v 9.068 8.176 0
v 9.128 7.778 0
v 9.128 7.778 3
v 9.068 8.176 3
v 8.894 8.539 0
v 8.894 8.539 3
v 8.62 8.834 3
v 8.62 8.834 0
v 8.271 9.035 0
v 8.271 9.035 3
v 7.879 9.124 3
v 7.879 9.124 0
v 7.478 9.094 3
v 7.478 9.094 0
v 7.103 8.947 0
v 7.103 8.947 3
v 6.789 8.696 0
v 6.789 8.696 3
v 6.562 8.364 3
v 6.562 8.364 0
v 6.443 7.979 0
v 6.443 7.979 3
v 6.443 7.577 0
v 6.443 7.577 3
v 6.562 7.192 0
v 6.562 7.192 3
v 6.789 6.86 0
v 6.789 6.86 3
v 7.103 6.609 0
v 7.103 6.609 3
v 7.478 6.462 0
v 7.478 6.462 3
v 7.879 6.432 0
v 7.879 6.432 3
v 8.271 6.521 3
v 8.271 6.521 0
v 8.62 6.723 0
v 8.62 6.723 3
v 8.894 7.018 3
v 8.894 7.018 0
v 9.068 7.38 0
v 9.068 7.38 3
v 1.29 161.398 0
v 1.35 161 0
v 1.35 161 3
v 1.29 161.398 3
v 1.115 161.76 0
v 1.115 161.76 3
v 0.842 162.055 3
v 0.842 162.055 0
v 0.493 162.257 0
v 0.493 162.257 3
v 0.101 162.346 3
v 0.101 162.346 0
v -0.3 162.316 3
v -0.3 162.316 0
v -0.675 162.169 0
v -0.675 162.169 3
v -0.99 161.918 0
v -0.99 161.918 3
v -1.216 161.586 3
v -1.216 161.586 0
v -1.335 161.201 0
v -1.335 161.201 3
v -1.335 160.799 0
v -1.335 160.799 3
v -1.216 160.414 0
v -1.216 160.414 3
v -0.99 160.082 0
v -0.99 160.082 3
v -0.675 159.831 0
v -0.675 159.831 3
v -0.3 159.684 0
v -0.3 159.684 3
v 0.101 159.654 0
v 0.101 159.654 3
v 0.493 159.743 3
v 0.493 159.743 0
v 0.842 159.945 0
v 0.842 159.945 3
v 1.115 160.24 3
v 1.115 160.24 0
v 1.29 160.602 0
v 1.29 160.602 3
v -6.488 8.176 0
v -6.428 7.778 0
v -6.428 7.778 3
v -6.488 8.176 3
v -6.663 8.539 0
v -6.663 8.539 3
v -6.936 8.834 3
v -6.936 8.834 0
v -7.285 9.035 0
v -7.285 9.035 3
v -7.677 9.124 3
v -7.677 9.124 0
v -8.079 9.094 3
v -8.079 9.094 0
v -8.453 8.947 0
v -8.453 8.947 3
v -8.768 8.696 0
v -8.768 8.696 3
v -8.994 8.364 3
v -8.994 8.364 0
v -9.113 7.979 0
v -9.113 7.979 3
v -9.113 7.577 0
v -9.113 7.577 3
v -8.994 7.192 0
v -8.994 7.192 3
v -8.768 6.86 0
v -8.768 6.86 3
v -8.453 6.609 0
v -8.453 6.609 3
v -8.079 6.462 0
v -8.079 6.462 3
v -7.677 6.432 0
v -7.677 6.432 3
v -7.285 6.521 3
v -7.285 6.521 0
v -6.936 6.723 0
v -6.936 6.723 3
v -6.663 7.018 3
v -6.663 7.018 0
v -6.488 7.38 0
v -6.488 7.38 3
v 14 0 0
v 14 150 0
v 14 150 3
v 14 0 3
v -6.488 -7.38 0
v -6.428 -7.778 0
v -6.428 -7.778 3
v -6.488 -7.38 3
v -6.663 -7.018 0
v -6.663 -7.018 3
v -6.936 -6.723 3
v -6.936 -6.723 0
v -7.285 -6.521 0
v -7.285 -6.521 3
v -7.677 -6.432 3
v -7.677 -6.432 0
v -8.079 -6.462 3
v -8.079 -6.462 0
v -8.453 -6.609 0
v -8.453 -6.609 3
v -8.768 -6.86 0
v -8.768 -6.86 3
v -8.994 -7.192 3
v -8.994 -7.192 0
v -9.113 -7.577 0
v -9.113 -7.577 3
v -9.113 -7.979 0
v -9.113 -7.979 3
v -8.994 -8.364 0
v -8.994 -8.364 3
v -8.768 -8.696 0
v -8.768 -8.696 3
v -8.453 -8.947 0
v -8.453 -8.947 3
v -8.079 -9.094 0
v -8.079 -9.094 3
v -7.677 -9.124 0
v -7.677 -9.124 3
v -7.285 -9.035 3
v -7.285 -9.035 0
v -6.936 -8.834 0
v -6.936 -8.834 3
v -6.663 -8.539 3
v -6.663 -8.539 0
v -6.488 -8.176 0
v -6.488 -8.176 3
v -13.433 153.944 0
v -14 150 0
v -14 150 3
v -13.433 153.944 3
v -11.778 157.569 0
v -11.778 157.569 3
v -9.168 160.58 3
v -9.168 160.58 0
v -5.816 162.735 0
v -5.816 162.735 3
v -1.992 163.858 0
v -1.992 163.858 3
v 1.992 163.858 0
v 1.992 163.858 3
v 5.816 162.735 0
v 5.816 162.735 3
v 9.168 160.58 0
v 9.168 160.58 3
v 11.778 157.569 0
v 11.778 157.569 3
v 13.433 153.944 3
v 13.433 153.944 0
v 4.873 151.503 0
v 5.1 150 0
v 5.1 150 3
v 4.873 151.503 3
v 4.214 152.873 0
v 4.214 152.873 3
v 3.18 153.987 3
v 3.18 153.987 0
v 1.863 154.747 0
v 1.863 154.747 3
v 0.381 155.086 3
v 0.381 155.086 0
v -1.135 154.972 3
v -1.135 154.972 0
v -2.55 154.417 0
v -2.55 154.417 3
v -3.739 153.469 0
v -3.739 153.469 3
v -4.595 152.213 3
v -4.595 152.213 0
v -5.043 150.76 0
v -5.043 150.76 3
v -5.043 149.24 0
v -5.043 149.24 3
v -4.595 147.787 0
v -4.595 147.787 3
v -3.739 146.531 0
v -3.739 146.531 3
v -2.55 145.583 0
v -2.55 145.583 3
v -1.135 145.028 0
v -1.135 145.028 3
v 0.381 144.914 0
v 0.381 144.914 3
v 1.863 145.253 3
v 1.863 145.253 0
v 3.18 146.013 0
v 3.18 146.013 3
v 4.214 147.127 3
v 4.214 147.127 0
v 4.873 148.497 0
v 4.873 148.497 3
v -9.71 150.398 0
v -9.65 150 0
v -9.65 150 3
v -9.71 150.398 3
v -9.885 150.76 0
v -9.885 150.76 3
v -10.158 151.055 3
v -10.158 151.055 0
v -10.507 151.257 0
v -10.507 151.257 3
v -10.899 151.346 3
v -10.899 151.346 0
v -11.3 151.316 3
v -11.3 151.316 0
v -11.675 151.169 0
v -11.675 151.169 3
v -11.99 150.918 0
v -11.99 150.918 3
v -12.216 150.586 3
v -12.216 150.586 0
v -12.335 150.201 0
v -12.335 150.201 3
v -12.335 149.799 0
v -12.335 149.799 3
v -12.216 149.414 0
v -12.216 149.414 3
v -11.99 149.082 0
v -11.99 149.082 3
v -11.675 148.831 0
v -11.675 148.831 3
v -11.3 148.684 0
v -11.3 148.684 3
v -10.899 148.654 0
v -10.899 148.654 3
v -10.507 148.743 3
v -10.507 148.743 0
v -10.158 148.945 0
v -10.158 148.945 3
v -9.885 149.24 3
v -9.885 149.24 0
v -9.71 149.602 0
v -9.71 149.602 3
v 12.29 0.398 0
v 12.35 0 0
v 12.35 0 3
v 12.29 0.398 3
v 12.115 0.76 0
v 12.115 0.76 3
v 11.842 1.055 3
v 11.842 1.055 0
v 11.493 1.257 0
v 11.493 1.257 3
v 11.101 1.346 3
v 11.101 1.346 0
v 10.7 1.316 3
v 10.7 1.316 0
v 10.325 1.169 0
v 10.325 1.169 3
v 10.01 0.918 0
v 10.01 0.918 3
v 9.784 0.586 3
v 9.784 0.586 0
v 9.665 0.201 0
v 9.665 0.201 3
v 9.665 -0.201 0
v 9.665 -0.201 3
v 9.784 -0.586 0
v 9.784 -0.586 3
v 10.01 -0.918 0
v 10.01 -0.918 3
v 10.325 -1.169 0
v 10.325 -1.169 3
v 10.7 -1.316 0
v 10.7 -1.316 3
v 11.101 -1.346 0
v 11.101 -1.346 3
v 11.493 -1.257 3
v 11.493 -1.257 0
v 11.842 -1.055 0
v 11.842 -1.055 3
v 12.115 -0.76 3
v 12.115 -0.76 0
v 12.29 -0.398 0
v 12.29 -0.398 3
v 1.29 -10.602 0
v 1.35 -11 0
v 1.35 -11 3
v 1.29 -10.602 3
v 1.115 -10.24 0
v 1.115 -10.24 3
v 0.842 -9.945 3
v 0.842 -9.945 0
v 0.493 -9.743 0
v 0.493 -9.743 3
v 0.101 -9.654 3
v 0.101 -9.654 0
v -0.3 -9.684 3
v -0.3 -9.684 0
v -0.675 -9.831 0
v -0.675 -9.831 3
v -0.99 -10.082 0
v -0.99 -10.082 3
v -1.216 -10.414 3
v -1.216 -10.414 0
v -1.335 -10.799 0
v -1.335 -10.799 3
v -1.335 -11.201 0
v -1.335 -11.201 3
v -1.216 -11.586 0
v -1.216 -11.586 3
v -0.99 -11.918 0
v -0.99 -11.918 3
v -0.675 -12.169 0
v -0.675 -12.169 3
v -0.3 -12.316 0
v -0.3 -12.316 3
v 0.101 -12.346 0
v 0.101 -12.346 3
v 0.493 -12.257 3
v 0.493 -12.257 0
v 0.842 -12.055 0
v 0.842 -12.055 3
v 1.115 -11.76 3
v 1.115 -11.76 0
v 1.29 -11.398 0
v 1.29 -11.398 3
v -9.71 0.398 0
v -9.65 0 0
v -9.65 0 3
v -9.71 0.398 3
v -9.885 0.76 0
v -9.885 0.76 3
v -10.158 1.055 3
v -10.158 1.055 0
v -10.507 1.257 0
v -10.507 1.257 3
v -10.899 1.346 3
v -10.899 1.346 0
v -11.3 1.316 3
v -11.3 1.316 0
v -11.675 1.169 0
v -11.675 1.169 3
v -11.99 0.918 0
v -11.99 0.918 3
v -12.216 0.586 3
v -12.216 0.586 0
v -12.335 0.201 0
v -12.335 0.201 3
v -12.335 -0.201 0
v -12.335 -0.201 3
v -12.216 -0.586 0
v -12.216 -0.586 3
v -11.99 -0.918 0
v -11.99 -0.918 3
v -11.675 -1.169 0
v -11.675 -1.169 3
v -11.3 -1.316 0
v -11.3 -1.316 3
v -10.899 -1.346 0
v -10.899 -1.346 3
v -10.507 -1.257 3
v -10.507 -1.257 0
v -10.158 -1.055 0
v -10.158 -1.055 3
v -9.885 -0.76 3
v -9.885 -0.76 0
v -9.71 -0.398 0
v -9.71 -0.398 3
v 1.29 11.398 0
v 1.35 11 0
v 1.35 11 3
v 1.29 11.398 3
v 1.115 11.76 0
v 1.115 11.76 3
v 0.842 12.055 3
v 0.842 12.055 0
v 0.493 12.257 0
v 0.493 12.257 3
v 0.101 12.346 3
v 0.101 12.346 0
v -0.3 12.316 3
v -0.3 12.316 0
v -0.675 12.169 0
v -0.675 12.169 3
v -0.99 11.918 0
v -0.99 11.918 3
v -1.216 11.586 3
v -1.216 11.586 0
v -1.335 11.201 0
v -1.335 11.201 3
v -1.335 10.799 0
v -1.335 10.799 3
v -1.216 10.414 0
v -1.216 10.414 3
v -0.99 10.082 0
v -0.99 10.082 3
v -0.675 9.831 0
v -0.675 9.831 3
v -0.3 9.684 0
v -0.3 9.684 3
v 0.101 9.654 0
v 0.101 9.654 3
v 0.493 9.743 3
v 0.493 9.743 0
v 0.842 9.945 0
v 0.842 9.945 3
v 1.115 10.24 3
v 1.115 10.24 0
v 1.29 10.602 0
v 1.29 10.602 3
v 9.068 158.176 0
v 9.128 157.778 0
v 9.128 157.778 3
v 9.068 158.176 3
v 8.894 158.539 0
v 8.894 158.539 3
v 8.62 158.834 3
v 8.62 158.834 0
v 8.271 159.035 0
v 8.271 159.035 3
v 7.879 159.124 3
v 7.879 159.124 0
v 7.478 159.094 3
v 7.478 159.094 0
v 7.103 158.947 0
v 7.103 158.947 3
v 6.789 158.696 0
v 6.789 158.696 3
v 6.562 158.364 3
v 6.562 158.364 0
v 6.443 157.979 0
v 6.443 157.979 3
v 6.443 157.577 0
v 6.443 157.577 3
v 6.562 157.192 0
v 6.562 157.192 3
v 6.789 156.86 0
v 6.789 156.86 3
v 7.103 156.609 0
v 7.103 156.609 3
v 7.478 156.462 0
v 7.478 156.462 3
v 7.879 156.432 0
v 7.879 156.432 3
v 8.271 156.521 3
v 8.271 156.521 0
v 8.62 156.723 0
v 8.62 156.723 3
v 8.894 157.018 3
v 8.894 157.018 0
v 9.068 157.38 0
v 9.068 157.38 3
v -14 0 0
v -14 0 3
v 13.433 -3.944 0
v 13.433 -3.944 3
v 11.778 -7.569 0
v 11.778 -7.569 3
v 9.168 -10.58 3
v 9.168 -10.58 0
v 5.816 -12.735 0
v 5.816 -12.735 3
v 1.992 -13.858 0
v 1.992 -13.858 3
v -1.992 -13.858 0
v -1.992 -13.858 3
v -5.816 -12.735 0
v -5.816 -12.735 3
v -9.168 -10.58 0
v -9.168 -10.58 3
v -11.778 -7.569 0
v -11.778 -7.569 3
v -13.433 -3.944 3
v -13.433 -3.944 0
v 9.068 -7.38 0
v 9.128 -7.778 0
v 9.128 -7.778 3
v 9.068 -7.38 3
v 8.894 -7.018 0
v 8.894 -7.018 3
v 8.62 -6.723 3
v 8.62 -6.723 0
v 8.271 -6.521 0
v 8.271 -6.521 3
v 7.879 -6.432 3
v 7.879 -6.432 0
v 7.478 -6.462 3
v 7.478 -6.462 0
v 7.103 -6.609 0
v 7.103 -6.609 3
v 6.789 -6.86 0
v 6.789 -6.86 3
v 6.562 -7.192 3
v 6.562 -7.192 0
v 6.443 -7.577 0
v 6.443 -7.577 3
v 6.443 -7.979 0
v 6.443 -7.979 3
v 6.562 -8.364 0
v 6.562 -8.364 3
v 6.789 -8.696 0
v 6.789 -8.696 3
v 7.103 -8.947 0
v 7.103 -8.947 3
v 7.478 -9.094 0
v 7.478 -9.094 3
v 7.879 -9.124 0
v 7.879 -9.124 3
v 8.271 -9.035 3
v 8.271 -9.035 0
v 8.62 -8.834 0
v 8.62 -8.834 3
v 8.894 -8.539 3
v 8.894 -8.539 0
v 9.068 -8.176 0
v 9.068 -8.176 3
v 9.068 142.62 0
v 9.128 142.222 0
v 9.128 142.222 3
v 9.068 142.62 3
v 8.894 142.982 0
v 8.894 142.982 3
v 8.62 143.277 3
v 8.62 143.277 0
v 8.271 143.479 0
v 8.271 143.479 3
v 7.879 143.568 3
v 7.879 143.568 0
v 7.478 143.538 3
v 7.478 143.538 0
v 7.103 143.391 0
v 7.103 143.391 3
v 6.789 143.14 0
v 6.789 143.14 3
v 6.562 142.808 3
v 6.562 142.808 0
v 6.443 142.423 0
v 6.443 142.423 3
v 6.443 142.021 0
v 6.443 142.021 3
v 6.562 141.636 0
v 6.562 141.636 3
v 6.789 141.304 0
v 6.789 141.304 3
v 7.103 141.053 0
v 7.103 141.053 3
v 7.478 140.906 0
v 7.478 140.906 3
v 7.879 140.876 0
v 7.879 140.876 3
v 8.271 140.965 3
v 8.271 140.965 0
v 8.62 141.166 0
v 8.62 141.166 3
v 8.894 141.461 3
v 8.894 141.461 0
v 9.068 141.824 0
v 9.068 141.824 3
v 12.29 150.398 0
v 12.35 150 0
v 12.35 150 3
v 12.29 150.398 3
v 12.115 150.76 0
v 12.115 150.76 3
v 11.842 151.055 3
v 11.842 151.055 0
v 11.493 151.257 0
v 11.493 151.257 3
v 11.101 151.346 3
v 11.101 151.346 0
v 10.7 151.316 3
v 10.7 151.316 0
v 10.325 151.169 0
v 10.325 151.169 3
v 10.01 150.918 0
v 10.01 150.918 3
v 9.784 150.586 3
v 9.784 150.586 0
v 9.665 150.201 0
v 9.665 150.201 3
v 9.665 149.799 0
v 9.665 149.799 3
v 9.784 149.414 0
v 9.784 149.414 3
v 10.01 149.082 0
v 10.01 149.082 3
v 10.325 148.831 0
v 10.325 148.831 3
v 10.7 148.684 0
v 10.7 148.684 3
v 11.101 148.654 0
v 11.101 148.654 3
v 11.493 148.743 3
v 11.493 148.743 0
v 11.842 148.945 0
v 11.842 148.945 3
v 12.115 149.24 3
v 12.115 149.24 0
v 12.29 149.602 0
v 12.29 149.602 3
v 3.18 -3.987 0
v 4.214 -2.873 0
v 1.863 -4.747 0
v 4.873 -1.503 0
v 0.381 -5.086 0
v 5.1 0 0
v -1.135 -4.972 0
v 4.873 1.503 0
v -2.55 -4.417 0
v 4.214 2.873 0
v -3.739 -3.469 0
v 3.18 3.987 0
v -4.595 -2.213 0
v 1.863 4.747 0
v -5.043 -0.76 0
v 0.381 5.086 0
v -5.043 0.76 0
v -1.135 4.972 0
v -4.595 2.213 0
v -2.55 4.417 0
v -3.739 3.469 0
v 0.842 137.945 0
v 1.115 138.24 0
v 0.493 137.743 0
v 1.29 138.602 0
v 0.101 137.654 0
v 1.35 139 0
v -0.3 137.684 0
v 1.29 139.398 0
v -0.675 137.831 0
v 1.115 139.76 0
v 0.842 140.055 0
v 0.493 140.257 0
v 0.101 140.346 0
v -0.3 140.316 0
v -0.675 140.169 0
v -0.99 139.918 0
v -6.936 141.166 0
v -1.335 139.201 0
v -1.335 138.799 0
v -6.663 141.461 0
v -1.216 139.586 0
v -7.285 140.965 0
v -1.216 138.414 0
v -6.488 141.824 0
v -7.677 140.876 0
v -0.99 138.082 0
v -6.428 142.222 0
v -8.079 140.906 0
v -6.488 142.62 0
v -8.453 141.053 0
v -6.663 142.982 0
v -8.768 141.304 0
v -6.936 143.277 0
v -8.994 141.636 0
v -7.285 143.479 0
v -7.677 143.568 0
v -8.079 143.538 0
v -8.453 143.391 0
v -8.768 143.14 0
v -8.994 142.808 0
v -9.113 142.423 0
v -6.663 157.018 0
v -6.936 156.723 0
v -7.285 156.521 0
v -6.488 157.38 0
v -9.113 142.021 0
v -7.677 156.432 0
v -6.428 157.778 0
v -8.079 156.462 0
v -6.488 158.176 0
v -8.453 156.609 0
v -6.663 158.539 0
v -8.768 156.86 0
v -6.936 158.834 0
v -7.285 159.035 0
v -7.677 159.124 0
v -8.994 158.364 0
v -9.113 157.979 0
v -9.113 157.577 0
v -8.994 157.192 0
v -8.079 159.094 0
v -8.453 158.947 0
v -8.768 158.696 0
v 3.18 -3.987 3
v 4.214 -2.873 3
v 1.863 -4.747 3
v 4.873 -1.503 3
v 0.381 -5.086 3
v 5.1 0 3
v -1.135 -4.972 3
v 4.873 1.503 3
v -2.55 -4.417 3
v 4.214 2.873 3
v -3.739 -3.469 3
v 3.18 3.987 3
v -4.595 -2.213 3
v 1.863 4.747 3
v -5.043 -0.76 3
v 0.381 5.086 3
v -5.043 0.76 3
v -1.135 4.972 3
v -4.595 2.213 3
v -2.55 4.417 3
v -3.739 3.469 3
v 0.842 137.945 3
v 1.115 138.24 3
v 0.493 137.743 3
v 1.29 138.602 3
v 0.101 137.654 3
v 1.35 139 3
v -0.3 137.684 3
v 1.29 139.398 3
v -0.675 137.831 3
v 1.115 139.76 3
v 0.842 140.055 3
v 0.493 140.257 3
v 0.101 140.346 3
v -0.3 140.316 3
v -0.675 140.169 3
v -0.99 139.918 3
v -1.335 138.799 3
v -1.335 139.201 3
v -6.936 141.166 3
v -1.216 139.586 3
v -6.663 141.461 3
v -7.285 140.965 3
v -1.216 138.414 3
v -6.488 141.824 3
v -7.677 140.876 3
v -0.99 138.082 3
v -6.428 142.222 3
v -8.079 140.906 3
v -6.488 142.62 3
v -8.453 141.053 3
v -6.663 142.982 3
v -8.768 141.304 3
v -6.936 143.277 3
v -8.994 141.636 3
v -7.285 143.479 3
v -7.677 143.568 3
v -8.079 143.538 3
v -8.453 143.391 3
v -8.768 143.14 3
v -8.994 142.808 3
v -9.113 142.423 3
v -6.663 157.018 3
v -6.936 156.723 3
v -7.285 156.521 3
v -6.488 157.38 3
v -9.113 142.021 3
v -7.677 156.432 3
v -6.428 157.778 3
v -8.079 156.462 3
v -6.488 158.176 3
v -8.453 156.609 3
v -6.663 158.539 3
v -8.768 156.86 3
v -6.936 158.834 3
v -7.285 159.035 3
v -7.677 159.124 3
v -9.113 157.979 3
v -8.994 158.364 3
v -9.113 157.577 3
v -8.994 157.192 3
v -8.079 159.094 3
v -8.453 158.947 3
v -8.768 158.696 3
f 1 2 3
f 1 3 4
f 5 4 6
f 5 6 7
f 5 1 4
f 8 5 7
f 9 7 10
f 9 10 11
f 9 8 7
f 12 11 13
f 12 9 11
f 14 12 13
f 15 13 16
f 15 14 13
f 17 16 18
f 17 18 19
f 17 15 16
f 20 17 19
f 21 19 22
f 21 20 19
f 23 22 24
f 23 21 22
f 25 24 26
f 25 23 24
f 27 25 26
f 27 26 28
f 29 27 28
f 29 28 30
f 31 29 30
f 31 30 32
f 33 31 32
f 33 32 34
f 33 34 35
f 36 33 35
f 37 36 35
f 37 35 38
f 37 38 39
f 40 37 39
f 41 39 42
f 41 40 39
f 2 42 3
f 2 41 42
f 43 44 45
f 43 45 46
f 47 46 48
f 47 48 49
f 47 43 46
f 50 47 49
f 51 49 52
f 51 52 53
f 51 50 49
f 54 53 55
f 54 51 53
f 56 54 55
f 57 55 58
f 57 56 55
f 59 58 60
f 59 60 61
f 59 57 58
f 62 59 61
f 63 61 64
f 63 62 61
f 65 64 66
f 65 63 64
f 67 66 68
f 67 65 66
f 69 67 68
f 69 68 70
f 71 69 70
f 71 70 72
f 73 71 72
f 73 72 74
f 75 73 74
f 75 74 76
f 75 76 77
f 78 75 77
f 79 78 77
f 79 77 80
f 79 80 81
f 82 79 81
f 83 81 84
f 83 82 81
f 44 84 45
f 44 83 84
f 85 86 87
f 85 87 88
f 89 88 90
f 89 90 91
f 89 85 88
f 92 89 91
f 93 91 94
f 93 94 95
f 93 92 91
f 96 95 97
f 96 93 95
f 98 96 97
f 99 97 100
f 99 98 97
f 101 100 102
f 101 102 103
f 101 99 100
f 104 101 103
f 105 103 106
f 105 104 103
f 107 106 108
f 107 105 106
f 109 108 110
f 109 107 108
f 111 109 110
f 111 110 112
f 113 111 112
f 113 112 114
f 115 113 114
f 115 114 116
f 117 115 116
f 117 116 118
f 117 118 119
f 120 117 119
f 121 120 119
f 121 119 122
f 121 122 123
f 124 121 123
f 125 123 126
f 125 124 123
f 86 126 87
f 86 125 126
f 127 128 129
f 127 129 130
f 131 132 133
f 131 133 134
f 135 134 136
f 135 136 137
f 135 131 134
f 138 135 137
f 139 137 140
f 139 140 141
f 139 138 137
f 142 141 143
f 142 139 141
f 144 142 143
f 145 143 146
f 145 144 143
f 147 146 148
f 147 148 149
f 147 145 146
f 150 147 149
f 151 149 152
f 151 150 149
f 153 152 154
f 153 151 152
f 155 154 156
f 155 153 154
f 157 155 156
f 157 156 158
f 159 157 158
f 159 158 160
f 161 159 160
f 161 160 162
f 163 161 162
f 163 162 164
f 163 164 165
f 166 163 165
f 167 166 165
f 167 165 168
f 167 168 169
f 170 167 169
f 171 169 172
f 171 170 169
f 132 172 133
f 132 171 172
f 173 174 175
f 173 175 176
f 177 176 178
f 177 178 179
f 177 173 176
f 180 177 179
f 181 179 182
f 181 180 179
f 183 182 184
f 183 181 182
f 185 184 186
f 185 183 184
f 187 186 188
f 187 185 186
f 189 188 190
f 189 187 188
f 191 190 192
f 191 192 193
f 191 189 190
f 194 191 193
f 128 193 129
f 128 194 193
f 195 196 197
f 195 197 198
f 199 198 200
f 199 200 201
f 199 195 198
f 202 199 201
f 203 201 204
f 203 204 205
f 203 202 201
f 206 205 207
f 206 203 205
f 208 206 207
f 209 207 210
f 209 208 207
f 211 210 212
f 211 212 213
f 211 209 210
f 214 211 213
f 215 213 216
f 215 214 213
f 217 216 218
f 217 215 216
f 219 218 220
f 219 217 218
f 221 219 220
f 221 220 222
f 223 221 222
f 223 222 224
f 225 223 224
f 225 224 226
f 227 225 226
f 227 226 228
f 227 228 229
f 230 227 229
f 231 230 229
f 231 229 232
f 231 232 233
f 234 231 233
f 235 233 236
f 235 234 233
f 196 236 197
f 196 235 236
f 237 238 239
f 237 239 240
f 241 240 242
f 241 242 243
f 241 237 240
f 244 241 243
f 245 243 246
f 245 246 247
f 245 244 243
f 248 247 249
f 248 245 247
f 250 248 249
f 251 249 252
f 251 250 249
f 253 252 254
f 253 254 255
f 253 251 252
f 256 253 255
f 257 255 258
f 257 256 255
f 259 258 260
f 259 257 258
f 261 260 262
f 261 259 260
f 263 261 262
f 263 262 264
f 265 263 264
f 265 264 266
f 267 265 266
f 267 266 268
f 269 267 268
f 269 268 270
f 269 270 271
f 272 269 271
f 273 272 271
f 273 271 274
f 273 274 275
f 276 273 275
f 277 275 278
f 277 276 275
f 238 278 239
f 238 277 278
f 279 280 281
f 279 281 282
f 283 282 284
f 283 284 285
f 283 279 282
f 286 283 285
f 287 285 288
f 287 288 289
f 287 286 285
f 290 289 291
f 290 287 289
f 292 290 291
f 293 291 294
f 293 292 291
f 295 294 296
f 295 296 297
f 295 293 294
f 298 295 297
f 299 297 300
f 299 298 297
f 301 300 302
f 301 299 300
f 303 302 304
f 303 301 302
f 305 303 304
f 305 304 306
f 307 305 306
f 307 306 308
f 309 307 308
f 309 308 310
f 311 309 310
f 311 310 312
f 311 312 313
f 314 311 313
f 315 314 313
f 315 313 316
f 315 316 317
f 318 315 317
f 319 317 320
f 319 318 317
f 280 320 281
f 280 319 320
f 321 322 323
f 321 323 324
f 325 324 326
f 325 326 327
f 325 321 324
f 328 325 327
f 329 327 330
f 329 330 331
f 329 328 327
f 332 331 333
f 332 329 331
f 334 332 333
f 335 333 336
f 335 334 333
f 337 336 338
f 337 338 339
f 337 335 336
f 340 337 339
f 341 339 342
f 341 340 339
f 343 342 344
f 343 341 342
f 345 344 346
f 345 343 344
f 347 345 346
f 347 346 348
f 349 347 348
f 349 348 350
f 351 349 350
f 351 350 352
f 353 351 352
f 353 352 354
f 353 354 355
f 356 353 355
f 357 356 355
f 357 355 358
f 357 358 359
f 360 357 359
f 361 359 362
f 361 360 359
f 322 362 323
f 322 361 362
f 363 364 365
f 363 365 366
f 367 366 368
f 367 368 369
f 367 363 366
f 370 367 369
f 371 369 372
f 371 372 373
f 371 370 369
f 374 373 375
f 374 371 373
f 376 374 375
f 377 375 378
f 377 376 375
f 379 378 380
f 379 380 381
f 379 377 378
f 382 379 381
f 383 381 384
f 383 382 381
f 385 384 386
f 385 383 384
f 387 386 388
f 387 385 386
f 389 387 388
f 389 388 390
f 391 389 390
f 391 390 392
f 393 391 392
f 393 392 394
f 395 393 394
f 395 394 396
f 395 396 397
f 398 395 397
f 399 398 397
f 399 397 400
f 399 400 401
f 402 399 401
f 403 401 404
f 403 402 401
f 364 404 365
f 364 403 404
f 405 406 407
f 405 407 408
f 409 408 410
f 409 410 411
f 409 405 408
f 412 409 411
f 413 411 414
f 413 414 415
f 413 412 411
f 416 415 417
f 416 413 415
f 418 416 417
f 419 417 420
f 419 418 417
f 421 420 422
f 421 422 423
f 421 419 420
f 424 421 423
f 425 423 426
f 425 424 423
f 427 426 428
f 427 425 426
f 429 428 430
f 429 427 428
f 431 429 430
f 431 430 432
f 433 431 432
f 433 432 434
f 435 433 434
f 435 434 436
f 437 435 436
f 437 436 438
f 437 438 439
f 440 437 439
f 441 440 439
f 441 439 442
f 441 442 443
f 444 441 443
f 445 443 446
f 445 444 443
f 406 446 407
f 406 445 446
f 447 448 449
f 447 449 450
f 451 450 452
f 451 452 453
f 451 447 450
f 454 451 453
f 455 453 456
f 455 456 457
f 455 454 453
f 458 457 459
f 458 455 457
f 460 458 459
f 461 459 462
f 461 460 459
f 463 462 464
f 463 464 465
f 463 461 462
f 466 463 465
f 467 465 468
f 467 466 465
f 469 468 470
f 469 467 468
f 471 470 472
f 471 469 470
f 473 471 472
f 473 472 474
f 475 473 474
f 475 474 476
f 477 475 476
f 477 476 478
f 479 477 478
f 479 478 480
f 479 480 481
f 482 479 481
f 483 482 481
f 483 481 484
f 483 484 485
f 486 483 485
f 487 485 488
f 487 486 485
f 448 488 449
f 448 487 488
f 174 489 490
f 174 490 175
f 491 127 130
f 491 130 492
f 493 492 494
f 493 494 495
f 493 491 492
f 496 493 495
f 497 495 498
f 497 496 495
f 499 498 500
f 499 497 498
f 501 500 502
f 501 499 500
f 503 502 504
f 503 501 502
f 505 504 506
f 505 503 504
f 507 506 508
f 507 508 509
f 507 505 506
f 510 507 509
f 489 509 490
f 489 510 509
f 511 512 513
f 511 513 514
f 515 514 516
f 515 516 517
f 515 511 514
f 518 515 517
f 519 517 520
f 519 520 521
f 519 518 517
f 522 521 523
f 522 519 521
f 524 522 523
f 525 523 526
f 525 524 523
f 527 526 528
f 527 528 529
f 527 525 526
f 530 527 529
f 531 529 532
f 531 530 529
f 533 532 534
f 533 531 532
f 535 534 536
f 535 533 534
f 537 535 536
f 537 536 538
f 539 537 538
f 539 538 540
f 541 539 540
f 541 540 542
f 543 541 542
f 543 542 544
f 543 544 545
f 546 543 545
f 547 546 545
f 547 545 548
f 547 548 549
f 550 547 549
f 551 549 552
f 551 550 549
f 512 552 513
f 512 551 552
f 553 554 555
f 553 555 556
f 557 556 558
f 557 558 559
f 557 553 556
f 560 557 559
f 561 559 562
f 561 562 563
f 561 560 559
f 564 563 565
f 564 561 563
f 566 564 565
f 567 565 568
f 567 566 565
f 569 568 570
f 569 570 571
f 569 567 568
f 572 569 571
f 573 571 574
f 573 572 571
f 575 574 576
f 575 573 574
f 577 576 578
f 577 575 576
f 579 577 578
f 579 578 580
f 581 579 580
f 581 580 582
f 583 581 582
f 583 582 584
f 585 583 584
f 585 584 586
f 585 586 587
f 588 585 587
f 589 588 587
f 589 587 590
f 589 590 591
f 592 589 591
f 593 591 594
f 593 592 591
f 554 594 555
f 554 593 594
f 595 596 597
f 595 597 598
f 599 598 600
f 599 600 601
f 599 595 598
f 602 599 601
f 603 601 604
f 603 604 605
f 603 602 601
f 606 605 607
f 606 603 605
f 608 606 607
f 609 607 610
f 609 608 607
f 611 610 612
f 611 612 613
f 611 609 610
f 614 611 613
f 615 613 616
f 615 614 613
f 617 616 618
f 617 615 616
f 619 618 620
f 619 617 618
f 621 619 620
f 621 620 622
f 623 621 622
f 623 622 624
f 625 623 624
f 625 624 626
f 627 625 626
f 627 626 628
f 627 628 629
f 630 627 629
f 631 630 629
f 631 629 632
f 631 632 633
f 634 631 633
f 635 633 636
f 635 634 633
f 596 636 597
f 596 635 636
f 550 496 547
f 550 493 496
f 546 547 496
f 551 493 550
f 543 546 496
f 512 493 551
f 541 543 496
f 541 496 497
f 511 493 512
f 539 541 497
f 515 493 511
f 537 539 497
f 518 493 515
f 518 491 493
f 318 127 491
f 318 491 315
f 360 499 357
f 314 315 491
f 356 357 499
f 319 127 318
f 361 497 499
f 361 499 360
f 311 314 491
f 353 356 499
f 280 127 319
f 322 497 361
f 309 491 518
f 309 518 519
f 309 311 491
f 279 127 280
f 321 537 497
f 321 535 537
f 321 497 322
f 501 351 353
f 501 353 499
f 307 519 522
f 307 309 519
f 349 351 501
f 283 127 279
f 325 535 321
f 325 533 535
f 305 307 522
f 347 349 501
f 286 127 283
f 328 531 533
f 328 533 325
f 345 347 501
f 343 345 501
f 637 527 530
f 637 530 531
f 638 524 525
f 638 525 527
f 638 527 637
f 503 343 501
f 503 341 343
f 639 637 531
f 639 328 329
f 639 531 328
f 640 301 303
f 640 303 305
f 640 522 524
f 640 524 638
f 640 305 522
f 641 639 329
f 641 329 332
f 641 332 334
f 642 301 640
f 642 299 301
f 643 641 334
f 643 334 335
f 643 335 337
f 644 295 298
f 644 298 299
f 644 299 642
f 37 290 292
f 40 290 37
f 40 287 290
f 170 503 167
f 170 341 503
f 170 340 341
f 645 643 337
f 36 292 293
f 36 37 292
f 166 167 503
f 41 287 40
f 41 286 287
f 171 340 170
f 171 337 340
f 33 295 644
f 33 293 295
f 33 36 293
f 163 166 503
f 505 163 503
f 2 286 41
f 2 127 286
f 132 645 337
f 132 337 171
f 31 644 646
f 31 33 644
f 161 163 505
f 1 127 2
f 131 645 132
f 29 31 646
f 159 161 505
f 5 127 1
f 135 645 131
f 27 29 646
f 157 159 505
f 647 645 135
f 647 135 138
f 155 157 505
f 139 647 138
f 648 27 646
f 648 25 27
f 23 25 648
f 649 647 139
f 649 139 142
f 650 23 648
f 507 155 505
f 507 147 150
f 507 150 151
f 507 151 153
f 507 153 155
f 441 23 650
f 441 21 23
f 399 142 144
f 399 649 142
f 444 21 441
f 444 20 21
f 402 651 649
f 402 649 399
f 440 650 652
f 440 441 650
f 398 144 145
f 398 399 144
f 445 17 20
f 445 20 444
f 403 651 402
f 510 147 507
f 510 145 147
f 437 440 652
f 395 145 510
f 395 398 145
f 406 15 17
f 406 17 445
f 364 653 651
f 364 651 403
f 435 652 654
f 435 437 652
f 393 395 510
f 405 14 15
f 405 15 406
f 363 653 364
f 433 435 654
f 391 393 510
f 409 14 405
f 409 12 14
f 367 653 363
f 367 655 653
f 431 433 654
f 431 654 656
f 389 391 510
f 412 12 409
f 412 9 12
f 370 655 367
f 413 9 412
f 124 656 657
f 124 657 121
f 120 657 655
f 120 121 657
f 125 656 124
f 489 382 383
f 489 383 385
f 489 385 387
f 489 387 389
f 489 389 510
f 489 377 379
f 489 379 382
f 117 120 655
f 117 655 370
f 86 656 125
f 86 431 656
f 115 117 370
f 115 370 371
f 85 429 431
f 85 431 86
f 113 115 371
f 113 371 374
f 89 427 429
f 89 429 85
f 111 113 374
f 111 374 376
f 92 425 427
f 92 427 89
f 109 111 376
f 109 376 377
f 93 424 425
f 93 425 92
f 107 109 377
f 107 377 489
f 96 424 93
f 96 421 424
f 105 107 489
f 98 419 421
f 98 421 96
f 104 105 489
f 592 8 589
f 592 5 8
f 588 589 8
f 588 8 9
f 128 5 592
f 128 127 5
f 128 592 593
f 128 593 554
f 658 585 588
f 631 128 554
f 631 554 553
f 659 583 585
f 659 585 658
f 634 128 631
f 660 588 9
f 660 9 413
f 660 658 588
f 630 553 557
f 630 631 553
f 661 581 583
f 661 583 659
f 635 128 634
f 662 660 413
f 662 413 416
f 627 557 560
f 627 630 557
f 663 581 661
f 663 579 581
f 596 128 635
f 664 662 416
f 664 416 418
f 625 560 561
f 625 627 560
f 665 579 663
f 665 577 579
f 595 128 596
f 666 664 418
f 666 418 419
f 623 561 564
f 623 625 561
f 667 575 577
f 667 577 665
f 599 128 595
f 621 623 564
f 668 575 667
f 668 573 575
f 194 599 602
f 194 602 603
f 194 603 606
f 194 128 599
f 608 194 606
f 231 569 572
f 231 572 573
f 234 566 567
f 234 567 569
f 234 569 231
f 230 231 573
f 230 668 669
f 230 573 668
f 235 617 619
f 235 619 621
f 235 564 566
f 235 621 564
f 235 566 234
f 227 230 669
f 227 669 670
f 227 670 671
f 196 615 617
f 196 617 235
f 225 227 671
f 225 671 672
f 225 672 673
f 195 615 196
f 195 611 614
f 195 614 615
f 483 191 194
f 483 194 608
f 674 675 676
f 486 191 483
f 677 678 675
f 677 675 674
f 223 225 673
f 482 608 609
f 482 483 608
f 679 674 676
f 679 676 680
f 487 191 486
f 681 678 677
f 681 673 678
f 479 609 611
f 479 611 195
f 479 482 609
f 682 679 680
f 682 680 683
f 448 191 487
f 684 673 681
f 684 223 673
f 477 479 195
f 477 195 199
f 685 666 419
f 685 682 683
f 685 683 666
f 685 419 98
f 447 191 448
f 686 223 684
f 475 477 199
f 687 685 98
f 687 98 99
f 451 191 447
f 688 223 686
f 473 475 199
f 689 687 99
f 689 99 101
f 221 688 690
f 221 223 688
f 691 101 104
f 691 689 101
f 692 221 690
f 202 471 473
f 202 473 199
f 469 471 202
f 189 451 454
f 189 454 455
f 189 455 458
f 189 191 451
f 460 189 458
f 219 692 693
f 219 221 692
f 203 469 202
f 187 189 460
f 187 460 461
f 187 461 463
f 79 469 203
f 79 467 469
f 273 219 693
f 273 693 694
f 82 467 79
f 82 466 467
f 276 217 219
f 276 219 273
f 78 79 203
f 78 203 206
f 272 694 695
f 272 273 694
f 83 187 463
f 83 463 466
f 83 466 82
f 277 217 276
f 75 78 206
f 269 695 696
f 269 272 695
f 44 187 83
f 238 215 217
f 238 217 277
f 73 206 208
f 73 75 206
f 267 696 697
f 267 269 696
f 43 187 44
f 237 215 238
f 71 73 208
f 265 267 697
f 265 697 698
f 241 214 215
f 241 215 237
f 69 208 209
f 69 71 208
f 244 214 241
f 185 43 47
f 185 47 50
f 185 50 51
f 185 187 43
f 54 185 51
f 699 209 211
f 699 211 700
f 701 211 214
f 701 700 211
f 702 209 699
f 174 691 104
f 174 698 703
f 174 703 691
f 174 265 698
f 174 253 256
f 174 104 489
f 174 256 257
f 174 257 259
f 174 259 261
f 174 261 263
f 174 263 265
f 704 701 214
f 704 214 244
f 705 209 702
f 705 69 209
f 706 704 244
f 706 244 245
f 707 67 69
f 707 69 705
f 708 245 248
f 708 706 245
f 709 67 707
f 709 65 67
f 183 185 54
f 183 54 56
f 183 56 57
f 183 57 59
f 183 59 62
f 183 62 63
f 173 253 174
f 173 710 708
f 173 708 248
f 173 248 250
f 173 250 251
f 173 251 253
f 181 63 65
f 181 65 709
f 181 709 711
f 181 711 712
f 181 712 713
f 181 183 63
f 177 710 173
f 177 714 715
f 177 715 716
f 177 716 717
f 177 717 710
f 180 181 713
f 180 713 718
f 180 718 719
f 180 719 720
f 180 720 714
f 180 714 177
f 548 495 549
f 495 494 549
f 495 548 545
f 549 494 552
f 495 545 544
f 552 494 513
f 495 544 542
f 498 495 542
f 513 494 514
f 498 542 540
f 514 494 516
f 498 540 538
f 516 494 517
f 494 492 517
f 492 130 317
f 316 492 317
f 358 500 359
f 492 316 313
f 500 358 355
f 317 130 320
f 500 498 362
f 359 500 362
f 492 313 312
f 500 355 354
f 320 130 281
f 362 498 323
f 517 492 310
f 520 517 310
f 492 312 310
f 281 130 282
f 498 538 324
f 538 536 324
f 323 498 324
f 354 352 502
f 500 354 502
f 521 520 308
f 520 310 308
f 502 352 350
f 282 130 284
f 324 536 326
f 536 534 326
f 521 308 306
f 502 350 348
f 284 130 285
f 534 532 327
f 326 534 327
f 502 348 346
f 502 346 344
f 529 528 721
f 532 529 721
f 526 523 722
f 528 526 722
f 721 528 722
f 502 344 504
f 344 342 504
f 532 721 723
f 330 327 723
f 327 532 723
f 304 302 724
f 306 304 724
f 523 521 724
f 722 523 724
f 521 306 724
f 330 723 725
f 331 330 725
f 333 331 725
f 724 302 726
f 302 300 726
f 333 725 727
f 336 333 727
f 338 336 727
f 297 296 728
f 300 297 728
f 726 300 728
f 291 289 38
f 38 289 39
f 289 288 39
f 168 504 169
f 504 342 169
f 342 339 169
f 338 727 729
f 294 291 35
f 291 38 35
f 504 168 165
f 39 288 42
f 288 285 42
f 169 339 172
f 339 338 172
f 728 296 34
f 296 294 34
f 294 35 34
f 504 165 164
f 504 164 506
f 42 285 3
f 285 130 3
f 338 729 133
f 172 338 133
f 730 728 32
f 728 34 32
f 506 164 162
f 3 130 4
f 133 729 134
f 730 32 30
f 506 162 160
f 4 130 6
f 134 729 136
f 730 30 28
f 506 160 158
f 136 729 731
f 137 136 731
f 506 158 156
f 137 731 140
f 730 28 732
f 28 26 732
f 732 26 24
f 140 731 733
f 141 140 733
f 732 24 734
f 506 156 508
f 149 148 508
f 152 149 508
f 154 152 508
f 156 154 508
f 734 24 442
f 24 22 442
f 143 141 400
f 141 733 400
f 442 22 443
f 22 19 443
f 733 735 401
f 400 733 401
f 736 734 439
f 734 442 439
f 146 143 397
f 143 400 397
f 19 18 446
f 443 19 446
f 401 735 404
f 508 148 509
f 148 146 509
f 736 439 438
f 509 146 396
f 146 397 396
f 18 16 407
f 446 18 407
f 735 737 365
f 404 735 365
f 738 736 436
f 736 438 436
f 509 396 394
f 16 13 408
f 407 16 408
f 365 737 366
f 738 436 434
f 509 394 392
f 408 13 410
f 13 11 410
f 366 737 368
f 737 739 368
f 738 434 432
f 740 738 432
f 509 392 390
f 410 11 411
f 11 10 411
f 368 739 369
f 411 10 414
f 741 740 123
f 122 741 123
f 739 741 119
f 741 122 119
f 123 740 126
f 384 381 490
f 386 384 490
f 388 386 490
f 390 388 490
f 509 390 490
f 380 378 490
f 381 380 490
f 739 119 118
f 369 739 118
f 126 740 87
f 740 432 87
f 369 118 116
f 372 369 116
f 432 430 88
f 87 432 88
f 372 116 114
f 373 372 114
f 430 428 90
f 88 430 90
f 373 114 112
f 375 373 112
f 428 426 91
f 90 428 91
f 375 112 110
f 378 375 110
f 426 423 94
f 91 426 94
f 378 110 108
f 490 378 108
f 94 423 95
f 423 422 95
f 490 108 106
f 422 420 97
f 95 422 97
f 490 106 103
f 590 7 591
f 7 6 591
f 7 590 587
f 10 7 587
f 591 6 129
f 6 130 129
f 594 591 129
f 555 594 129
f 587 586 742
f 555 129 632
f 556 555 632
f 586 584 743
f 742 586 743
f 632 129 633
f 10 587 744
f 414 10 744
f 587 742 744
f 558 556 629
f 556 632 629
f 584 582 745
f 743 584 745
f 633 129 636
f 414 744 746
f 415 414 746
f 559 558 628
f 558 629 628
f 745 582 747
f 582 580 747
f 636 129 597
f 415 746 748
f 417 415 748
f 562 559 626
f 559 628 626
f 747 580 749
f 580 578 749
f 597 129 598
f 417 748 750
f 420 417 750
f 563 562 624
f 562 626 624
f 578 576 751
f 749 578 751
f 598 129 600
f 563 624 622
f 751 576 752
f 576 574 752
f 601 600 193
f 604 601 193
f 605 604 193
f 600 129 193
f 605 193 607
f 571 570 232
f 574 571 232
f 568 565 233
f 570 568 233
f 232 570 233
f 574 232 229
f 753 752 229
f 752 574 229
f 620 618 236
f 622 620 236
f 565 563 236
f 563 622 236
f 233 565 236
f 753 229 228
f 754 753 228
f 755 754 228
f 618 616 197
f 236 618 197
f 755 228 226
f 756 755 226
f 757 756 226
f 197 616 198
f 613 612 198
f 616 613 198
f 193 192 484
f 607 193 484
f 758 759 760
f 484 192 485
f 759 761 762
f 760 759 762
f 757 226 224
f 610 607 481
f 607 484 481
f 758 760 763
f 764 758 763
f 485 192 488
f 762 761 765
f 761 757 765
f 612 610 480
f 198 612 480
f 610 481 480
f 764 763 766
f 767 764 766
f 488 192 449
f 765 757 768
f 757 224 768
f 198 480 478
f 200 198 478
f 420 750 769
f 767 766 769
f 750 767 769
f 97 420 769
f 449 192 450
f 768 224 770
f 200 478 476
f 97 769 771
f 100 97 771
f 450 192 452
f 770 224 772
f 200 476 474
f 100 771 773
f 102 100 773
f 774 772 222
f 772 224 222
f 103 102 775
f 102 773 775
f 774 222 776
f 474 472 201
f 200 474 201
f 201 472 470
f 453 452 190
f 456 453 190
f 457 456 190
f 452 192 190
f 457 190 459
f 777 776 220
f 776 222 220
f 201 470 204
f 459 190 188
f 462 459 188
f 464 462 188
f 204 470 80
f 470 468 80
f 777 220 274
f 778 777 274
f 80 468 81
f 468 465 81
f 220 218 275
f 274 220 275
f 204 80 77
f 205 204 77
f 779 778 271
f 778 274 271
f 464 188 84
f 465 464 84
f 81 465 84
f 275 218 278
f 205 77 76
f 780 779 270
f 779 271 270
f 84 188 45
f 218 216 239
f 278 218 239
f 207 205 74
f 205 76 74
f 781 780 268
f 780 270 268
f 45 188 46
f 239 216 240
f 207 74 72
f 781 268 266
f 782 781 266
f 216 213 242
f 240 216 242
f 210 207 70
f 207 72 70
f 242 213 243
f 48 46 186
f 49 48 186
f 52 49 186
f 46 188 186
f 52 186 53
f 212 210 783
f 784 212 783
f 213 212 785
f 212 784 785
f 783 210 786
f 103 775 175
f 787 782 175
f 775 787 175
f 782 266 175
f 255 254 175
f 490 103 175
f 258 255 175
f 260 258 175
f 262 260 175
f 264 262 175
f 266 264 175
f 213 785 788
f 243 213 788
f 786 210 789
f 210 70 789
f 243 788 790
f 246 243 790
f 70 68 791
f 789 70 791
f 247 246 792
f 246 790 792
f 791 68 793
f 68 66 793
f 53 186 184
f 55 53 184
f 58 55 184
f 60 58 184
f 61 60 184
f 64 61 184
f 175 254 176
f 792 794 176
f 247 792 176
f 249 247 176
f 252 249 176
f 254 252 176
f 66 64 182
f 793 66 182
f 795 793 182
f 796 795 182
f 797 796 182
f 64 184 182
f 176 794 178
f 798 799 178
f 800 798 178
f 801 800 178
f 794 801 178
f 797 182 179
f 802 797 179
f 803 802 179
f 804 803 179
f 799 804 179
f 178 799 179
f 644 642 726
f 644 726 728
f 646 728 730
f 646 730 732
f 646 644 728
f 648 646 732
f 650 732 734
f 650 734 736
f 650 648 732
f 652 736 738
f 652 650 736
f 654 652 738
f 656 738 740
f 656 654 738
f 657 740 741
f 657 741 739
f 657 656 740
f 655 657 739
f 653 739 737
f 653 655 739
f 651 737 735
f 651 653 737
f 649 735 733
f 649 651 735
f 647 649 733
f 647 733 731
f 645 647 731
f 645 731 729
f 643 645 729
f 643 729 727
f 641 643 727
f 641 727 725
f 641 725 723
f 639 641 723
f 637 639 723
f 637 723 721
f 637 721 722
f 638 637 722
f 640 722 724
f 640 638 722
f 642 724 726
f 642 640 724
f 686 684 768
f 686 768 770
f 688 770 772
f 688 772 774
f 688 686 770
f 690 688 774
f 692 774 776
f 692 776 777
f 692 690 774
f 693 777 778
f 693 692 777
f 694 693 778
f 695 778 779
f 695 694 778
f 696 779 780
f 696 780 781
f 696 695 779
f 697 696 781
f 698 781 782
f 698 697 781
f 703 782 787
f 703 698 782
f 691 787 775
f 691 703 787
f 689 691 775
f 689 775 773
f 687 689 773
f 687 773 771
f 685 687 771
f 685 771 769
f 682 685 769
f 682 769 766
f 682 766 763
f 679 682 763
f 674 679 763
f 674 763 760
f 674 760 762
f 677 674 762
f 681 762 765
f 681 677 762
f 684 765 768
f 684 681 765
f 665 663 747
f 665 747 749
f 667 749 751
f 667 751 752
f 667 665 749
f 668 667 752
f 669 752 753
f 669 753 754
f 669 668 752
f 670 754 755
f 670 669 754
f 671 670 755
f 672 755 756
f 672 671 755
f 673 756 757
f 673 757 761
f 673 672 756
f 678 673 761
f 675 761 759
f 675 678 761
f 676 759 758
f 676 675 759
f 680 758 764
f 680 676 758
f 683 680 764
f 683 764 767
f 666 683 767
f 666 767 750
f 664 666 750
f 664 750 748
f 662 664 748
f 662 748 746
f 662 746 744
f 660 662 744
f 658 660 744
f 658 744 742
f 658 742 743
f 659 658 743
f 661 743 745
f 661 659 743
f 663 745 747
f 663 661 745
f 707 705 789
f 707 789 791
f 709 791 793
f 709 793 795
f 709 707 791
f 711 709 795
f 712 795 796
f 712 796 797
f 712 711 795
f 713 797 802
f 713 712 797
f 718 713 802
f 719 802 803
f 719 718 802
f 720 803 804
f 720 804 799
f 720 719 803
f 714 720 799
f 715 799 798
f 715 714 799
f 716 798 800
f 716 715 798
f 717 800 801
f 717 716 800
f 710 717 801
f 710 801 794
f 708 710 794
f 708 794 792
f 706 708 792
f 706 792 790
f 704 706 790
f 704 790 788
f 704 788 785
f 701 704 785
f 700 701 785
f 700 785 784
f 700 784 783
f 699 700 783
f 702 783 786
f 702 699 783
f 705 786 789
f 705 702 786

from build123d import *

# Parameters (mm, degrees)
SKETCH_1_R      = 1.35
SKETCH_1_R_2    = 5.1
EXTRUDE_1_DEPTH = 3


with BuildPart() as part:
    # 草图1 → 凸台-拉伸1 (new body)
    with BuildSketch(Plane.XY):
        with BuildLine():
            Line((-14, 0), (-14, 150))
            ThreePointArc((-14, 150), (0, 164), (14, 150))
            Line((14, 150), (14, 0))
            ThreePointArc((14, 0), (0, -14), (-14, 0))
        make_face()
        with Locations((0, 161)):
            Circle(SKETCH_1_R, mode=Mode.SUBTRACT)
        with Locations((7.778174593, 157.778174593)):
            Circle(SKETCH_1_R, mode=Mode.SUBTRACT)
        with Locations((11, 150)):
            Circle(SKETCH_1_R, mode=Mode.SUBTRACT)
        with Locations((7.778174593, 142.221825407)):
            Circle(SKETCH_1_R, mode=Mode.SUBTRACT)
        with Locations((0, 139)):
            Circle(SKETCH_1_R, mode=Mode.SUBTRACT)
        with Locations((-7.778174593, 142.221825407)):
            Circle(SKETCH_1_R, mode=Mode.SUBTRACT)
        with Locations((-11, 150)):
            Circle(SKETCH_1_R, mode=Mode.SUBTRACT)
        with Locations((-7.778174593, 157.778174593)):
            Circle(SKETCH_1_R, mode=Mode.SUBTRACT)
        with Locations((0, 150)):
            Circle(SKETCH_1_R_2, mode=Mode.SUBTRACT)
        Circle(SKETCH_1_R_2, mode=Mode.SUBTRACT)
        with Locations((0, -11)):
            Circle(SKETCH_1_R, mode=Mode.SUBTRACT)
        with Locations((-7.778174593, -7.778174593)):
            Circle(SKETCH_1_R, mode=Mode.SUBTRACT)
        with Locations((-11, 0)):
            Circle(SKETCH_1_R, mode=Mode.SUBTRACT)
        with Locations((-7.778174593, 7.778174593)):
            Circle(SKETCH_1_R, mode=Mode.SUBTRACT)
        with Locations((0, 11)):
            Circle(SKETCH_1_R, mode=Mode.SUBTRACT)
        with Locations((7.778174593, 7.778174593)):
            Circle(SKETCH_1_R, mode=Mode.SUBTRACT)
        with Locations((11, 0)):
            Circle(SKETCH_1_R, mode=Mode.SUBTRACT)
        with Locations((7.778174593, -7.778174593)):
            Circle(SKETCH_1_R, mode=Mode.SUBTRACT)
    extrude(amount=EXTRUDE_1_DEPTH)


solid = part.part
